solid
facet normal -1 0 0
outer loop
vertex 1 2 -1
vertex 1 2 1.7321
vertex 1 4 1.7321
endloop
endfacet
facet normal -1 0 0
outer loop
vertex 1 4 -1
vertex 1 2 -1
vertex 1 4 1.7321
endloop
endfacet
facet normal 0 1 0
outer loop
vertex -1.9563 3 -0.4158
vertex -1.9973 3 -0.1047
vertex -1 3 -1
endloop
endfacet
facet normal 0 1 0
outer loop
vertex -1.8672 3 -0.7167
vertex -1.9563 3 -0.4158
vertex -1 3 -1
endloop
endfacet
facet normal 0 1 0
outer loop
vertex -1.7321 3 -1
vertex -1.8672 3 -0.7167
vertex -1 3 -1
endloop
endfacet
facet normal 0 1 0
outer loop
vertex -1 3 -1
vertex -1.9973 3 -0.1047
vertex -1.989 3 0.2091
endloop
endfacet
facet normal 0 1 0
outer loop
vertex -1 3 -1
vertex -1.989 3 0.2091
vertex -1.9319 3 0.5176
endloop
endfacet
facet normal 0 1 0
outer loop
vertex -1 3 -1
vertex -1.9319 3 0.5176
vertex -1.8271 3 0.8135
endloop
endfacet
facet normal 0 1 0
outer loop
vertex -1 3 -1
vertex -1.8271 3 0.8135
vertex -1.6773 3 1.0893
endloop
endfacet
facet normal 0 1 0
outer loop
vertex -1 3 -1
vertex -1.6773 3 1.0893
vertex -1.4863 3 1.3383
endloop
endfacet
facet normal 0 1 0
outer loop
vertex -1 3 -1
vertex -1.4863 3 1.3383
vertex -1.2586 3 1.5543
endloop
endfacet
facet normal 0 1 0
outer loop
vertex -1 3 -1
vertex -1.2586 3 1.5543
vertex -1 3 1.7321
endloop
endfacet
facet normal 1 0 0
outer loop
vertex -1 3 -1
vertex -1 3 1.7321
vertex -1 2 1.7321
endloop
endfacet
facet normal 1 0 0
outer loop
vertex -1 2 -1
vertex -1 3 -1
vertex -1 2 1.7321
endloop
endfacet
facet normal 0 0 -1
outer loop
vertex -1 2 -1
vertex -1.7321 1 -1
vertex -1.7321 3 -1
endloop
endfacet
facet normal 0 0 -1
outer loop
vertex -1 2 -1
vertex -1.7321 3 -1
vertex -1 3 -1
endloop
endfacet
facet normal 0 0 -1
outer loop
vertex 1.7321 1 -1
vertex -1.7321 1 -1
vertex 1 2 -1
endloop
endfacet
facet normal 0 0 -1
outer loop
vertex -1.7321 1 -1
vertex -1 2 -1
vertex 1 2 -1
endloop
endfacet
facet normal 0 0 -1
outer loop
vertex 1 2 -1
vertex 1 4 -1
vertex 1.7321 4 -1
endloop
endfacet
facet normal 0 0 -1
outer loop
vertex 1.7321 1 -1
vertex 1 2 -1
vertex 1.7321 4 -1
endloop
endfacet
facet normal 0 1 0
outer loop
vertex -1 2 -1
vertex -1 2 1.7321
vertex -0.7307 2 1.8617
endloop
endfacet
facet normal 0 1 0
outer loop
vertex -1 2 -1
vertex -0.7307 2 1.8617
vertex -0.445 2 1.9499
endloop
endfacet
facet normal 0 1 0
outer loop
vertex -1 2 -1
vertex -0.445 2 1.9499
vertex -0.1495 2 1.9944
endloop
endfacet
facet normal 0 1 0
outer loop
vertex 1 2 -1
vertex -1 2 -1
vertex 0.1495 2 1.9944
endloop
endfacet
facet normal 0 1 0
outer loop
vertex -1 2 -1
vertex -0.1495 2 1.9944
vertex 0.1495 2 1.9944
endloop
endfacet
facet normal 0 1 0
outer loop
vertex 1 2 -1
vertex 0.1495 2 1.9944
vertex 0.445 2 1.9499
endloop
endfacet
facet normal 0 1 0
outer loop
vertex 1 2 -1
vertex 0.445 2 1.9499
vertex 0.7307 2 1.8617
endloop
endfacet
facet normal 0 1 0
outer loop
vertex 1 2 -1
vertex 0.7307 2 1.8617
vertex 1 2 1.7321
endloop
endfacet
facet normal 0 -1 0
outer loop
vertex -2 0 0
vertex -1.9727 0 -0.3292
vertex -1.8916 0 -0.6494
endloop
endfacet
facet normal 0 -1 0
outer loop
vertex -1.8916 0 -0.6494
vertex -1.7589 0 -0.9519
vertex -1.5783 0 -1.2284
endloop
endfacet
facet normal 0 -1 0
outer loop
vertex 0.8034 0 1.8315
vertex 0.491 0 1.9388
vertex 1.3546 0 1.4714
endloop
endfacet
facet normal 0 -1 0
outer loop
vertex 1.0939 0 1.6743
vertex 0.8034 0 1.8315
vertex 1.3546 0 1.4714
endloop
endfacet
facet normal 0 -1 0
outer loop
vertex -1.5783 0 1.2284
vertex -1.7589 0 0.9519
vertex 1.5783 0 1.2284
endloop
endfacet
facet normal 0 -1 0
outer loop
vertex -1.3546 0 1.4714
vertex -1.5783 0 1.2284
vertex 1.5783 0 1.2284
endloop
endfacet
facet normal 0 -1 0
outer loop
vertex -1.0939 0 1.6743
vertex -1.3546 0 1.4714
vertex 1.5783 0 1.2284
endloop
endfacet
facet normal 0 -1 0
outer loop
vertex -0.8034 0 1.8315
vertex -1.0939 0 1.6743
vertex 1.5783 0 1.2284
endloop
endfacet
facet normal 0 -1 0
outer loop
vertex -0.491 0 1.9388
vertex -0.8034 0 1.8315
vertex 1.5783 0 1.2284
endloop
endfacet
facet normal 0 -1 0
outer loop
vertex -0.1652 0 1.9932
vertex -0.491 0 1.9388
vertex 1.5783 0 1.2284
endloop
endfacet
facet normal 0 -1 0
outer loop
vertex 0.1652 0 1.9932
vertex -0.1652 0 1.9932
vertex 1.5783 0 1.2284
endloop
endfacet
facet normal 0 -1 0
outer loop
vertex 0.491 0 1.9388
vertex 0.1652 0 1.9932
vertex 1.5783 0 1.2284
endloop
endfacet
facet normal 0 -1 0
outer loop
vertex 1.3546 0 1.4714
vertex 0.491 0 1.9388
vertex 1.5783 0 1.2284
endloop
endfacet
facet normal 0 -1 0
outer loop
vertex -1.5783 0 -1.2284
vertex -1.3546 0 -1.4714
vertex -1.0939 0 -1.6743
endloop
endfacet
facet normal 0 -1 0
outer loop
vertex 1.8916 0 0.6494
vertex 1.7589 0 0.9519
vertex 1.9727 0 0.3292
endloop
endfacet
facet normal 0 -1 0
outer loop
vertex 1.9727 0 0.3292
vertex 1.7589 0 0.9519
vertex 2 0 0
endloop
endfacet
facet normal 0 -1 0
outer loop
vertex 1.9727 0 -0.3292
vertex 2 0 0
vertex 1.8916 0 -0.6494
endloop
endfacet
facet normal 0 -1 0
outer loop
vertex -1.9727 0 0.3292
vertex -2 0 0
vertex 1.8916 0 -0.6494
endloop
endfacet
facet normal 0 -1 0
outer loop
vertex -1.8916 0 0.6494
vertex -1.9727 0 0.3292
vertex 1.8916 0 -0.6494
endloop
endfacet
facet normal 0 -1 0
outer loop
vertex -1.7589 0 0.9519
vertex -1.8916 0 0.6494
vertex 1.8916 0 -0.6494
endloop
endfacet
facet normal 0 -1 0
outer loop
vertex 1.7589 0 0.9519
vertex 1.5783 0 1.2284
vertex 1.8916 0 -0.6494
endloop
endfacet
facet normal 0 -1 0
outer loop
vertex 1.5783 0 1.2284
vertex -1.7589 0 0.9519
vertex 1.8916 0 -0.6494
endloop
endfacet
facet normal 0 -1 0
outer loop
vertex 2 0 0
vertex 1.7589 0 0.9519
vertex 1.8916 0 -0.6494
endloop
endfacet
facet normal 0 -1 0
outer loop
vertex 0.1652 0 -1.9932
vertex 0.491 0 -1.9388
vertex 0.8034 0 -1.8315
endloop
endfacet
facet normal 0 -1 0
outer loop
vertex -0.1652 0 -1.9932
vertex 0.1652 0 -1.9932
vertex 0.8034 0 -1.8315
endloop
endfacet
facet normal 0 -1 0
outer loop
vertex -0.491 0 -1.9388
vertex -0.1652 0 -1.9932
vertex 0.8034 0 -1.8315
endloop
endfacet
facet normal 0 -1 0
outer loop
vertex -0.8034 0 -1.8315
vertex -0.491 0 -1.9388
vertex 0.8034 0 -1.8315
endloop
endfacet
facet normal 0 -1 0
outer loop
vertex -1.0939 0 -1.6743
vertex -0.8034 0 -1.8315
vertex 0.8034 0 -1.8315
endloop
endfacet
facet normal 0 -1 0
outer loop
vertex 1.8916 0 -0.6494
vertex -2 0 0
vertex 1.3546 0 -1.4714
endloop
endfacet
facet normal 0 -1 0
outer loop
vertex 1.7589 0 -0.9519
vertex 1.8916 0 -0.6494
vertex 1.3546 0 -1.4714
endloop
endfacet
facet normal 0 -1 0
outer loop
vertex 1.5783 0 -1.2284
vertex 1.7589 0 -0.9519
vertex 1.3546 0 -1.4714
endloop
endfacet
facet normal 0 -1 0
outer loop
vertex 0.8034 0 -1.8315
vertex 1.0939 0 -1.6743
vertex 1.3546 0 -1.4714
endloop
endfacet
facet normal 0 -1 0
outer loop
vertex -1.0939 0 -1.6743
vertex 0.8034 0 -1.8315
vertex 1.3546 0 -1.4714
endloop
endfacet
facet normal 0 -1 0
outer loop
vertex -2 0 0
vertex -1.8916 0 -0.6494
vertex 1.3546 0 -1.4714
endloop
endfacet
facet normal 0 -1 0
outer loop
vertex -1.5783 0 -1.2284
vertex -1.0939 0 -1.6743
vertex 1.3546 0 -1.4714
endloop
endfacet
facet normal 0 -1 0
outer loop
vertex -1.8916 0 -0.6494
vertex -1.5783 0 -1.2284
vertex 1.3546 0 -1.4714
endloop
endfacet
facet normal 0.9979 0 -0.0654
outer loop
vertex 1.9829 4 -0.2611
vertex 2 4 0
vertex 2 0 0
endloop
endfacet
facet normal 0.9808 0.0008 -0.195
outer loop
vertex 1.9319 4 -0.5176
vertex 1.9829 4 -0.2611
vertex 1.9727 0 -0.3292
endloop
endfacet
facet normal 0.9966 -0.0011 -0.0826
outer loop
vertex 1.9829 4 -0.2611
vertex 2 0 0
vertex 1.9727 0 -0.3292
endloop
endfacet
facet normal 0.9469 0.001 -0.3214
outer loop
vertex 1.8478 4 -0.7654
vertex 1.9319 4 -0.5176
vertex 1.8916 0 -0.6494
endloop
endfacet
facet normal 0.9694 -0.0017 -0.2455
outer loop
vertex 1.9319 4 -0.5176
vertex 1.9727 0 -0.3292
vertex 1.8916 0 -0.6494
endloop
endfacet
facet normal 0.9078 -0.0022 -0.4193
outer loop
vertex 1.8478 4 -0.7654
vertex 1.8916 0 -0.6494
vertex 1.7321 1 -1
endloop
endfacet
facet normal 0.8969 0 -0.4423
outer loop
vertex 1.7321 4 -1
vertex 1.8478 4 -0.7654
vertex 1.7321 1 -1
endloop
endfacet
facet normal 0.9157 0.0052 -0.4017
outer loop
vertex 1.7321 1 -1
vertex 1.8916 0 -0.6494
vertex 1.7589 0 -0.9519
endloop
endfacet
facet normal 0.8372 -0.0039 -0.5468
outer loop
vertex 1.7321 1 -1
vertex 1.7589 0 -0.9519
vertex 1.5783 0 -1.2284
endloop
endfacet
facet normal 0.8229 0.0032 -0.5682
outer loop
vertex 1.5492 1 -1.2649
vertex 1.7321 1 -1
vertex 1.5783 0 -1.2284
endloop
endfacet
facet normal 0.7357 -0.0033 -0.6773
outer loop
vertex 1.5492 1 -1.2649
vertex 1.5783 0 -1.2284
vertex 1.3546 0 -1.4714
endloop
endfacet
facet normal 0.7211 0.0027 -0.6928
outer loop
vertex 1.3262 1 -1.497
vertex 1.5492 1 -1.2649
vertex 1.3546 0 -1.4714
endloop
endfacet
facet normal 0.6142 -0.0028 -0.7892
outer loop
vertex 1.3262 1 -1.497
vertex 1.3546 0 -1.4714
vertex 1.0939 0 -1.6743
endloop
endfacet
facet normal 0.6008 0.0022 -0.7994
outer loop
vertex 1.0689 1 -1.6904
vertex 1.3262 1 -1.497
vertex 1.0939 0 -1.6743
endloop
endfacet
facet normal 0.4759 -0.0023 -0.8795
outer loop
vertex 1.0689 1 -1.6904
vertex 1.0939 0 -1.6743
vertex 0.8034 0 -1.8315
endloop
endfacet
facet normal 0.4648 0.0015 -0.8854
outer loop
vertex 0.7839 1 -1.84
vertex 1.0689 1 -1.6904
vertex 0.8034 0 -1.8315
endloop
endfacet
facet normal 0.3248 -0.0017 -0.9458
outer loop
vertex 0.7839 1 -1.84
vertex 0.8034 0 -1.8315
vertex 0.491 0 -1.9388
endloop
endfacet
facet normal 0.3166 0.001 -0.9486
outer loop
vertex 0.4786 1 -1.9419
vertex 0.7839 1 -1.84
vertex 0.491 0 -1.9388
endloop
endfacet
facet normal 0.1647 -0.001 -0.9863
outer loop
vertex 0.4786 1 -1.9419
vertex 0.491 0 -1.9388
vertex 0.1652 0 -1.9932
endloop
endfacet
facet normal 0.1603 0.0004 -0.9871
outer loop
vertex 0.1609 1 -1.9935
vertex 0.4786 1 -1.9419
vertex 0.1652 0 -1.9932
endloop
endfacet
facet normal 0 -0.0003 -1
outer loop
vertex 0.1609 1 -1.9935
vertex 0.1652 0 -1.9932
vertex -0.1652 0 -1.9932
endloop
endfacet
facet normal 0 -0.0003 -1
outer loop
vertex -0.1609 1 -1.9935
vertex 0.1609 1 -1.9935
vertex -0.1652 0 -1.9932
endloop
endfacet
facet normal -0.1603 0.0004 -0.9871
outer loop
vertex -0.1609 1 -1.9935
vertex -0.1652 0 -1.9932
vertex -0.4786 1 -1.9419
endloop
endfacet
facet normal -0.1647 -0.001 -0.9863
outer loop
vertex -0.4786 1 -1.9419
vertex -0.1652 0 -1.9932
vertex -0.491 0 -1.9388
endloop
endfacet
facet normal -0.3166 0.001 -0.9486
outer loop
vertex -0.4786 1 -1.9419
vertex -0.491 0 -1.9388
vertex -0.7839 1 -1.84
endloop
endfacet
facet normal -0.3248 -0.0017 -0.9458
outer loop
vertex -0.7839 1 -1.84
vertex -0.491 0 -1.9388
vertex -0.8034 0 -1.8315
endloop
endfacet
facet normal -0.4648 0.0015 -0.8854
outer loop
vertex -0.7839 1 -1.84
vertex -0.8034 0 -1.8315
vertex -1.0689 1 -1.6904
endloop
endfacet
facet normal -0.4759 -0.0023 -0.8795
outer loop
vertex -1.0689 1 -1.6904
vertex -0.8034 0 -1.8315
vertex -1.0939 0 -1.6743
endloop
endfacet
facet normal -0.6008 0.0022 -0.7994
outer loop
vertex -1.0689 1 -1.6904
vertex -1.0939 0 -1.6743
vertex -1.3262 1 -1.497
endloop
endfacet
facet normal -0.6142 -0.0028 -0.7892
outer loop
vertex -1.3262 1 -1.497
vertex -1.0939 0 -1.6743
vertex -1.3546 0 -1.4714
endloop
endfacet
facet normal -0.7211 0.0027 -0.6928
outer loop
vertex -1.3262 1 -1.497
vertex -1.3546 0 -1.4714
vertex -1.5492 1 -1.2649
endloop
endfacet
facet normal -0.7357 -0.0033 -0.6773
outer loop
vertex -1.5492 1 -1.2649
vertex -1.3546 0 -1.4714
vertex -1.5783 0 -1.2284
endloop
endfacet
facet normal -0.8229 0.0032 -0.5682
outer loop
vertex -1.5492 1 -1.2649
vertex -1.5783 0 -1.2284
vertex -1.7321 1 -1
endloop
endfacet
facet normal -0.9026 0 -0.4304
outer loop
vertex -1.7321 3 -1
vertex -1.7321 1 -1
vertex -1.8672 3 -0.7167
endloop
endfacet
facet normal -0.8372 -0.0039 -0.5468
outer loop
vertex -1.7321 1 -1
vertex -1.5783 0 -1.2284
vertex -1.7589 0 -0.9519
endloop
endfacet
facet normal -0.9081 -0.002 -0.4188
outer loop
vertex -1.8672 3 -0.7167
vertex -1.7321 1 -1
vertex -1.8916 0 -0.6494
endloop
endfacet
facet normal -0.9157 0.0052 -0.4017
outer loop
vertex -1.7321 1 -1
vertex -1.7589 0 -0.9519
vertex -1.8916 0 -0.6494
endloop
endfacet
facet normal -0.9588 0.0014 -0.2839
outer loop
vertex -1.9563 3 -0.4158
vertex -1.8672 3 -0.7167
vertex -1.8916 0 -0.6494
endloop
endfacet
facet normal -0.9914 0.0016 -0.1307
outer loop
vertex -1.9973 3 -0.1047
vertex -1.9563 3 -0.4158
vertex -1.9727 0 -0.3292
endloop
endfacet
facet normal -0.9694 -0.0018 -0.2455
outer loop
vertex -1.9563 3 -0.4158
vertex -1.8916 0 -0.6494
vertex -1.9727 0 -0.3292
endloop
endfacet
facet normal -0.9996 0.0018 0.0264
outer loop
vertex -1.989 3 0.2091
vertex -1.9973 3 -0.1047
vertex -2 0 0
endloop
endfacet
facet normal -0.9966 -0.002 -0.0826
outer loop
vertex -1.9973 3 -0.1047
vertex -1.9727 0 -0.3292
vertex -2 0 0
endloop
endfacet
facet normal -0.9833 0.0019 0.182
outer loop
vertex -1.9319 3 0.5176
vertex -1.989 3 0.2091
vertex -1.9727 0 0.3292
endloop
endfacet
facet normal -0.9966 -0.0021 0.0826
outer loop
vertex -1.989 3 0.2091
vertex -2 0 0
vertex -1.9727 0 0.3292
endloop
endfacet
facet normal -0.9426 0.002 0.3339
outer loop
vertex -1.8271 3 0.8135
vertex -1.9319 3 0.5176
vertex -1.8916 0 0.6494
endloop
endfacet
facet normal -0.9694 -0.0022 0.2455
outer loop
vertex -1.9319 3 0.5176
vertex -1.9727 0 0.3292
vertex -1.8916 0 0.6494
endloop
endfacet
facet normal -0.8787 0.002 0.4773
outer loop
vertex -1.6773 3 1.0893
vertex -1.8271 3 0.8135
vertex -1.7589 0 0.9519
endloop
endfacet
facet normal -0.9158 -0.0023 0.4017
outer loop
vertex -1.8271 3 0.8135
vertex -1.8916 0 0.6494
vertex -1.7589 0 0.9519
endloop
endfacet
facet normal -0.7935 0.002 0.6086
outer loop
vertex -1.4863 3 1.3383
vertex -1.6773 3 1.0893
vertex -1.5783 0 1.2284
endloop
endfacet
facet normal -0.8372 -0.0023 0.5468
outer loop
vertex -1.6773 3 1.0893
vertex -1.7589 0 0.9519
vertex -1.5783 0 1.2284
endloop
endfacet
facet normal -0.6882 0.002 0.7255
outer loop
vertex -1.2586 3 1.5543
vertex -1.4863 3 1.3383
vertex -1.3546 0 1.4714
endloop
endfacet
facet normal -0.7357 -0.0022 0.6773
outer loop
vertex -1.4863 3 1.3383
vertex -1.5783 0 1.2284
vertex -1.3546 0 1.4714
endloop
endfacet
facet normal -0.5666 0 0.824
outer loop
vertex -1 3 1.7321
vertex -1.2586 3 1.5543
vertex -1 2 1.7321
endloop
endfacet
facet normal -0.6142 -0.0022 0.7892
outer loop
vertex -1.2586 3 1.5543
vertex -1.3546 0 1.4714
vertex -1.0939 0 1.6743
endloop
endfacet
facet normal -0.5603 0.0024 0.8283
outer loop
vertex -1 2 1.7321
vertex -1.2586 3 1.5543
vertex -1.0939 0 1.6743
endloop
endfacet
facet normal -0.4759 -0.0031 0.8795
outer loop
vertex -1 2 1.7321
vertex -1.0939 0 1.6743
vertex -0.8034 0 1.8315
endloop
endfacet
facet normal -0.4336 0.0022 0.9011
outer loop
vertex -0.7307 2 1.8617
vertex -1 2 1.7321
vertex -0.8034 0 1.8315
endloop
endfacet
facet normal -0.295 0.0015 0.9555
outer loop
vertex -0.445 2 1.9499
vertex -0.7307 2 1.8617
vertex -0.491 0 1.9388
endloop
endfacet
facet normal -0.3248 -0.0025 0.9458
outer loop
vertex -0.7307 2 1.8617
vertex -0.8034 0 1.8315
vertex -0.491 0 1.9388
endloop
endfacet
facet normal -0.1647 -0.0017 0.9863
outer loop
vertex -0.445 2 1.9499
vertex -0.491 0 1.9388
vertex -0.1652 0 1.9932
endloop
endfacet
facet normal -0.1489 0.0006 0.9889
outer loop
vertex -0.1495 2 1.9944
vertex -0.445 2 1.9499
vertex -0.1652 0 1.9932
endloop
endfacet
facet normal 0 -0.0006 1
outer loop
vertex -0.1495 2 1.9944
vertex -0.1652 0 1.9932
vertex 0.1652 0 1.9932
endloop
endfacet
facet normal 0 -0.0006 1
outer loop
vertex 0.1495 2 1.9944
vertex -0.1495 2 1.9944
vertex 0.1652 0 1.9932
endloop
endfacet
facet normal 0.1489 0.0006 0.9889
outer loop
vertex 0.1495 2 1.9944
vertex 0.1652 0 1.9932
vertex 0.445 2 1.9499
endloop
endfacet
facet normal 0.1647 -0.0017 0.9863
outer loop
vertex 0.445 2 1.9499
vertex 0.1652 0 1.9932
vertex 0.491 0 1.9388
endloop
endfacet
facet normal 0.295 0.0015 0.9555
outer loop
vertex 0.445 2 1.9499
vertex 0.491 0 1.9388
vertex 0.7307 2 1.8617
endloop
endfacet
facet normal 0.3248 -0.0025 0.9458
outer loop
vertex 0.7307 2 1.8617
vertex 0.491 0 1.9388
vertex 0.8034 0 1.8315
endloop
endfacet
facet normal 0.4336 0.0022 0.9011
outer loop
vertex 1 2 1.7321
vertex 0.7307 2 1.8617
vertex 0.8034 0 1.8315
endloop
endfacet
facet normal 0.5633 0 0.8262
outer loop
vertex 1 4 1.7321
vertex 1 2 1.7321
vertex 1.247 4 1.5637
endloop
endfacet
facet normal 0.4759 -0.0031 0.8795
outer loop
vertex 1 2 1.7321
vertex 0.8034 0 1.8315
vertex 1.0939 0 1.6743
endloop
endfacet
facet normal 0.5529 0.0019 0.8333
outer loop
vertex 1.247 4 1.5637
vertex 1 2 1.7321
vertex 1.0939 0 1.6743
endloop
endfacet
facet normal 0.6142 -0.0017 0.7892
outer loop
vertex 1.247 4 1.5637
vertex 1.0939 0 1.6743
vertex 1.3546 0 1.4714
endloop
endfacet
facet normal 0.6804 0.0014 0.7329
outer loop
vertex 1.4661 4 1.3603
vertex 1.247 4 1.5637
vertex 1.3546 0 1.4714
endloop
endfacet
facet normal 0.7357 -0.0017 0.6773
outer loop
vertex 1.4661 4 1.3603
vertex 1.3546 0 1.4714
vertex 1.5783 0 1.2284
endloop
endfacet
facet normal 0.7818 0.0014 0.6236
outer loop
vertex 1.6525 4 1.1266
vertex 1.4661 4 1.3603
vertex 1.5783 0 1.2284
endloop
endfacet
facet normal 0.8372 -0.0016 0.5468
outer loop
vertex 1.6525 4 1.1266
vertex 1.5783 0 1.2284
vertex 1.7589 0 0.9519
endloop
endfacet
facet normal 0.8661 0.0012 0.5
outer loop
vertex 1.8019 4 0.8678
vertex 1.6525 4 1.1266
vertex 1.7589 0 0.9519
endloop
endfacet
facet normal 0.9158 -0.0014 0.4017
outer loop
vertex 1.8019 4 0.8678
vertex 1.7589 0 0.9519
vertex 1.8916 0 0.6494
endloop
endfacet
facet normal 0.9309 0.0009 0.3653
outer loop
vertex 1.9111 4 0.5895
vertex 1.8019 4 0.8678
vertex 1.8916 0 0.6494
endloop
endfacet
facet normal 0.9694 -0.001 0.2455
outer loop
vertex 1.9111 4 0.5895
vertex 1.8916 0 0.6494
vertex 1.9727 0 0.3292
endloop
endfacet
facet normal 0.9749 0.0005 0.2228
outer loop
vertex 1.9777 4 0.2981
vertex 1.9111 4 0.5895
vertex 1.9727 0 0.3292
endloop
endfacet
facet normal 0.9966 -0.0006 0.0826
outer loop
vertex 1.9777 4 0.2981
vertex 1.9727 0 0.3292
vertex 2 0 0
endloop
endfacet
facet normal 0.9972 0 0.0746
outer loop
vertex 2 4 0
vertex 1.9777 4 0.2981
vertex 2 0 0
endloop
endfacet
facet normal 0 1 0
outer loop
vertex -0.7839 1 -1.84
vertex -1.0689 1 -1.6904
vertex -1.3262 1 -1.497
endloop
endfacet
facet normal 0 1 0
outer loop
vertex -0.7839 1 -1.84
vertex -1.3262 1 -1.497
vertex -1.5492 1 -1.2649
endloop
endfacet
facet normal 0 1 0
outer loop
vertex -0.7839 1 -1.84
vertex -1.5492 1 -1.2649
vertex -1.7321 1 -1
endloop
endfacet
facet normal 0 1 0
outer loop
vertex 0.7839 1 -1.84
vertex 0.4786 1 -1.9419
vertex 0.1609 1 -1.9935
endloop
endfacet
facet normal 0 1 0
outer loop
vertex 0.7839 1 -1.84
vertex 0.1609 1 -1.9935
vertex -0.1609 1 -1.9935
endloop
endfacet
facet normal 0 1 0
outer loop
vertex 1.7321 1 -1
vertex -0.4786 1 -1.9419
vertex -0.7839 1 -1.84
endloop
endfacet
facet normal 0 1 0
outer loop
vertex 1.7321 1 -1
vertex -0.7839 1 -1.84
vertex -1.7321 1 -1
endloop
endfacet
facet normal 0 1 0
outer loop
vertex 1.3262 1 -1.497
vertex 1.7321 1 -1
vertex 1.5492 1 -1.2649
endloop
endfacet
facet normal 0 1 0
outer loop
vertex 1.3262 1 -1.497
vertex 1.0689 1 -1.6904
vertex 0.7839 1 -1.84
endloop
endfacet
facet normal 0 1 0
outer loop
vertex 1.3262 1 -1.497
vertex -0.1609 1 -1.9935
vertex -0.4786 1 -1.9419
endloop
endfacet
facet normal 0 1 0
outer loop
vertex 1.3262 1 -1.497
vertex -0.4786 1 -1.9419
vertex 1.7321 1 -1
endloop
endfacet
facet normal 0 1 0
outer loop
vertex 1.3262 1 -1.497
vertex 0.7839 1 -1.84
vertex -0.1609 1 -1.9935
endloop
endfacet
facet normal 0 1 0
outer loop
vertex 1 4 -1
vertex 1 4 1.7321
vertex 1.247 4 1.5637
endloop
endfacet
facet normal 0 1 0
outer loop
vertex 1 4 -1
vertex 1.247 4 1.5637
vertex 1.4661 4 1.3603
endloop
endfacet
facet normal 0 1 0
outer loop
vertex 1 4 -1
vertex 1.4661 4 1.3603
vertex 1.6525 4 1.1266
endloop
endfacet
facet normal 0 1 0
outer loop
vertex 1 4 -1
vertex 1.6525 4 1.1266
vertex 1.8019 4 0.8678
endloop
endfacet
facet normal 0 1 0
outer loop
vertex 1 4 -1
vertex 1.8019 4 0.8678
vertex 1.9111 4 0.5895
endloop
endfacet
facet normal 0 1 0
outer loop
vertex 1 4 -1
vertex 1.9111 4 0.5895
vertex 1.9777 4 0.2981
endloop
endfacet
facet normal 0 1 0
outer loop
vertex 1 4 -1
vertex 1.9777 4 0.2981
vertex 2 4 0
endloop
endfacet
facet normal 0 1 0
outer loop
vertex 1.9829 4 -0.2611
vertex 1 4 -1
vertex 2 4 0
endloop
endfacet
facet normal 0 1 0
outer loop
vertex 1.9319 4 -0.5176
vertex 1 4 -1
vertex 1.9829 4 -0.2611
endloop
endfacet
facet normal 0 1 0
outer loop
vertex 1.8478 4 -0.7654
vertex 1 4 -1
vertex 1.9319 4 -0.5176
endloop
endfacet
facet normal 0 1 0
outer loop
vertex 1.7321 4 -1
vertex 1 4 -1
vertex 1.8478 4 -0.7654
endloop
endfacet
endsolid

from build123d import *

# Parameters (mm, degrees)
SKETCH1_R           = 2
BOSS_EXTRUDE1_DEPTH = 4
CUT_EXTRUDE2_DEPTH  = 3
CUT_EXTRUDE3_DEPTH  = 5.5


with BuildPart() as part:
    # Sketch1 → Boss-Extrude1 (new body)
    with BuildSketch(Plane(origin=(0, 0, 0), x_dir=(1, 0, 0), z_dir=(0, 1, 0))):
        Circle(SKETCH1_R)
    extrude(amount=BOSS_EXTRUDE1_DEPTH)

    # Sketch3 → Cut-Extrude2 (cut)
    with BuildSketch(Plane(origin=(0, 4, 0), x_dir=(1, 0, 0), z_dir=(0, 1, 0))):
        with BuildLine():
            Line((-1.732050808, 1), (1.732050808, 1))
            ThreePointArc((1.732050808, 1), (0, 2), (-1.732050808, 1))
        make_face()
    extrude(amount=-CUT_EXTRUDE2_DEPTH, mode=Mode.SUBTRACT)

    # Sketch4 → Cut-Extrude3 (cut, symmetric)
    with BuildSketch(Plane.XY):
        Polygon((-2, 3), (-1, 3), (-1, 2), (1, 2), (1, 4), (-2, 4), align=None)
    extrude(amount=CUT_EXTRUDE3_DEPTH, both=True, mode=Mode.SUBTRACT)


solid = part.part
